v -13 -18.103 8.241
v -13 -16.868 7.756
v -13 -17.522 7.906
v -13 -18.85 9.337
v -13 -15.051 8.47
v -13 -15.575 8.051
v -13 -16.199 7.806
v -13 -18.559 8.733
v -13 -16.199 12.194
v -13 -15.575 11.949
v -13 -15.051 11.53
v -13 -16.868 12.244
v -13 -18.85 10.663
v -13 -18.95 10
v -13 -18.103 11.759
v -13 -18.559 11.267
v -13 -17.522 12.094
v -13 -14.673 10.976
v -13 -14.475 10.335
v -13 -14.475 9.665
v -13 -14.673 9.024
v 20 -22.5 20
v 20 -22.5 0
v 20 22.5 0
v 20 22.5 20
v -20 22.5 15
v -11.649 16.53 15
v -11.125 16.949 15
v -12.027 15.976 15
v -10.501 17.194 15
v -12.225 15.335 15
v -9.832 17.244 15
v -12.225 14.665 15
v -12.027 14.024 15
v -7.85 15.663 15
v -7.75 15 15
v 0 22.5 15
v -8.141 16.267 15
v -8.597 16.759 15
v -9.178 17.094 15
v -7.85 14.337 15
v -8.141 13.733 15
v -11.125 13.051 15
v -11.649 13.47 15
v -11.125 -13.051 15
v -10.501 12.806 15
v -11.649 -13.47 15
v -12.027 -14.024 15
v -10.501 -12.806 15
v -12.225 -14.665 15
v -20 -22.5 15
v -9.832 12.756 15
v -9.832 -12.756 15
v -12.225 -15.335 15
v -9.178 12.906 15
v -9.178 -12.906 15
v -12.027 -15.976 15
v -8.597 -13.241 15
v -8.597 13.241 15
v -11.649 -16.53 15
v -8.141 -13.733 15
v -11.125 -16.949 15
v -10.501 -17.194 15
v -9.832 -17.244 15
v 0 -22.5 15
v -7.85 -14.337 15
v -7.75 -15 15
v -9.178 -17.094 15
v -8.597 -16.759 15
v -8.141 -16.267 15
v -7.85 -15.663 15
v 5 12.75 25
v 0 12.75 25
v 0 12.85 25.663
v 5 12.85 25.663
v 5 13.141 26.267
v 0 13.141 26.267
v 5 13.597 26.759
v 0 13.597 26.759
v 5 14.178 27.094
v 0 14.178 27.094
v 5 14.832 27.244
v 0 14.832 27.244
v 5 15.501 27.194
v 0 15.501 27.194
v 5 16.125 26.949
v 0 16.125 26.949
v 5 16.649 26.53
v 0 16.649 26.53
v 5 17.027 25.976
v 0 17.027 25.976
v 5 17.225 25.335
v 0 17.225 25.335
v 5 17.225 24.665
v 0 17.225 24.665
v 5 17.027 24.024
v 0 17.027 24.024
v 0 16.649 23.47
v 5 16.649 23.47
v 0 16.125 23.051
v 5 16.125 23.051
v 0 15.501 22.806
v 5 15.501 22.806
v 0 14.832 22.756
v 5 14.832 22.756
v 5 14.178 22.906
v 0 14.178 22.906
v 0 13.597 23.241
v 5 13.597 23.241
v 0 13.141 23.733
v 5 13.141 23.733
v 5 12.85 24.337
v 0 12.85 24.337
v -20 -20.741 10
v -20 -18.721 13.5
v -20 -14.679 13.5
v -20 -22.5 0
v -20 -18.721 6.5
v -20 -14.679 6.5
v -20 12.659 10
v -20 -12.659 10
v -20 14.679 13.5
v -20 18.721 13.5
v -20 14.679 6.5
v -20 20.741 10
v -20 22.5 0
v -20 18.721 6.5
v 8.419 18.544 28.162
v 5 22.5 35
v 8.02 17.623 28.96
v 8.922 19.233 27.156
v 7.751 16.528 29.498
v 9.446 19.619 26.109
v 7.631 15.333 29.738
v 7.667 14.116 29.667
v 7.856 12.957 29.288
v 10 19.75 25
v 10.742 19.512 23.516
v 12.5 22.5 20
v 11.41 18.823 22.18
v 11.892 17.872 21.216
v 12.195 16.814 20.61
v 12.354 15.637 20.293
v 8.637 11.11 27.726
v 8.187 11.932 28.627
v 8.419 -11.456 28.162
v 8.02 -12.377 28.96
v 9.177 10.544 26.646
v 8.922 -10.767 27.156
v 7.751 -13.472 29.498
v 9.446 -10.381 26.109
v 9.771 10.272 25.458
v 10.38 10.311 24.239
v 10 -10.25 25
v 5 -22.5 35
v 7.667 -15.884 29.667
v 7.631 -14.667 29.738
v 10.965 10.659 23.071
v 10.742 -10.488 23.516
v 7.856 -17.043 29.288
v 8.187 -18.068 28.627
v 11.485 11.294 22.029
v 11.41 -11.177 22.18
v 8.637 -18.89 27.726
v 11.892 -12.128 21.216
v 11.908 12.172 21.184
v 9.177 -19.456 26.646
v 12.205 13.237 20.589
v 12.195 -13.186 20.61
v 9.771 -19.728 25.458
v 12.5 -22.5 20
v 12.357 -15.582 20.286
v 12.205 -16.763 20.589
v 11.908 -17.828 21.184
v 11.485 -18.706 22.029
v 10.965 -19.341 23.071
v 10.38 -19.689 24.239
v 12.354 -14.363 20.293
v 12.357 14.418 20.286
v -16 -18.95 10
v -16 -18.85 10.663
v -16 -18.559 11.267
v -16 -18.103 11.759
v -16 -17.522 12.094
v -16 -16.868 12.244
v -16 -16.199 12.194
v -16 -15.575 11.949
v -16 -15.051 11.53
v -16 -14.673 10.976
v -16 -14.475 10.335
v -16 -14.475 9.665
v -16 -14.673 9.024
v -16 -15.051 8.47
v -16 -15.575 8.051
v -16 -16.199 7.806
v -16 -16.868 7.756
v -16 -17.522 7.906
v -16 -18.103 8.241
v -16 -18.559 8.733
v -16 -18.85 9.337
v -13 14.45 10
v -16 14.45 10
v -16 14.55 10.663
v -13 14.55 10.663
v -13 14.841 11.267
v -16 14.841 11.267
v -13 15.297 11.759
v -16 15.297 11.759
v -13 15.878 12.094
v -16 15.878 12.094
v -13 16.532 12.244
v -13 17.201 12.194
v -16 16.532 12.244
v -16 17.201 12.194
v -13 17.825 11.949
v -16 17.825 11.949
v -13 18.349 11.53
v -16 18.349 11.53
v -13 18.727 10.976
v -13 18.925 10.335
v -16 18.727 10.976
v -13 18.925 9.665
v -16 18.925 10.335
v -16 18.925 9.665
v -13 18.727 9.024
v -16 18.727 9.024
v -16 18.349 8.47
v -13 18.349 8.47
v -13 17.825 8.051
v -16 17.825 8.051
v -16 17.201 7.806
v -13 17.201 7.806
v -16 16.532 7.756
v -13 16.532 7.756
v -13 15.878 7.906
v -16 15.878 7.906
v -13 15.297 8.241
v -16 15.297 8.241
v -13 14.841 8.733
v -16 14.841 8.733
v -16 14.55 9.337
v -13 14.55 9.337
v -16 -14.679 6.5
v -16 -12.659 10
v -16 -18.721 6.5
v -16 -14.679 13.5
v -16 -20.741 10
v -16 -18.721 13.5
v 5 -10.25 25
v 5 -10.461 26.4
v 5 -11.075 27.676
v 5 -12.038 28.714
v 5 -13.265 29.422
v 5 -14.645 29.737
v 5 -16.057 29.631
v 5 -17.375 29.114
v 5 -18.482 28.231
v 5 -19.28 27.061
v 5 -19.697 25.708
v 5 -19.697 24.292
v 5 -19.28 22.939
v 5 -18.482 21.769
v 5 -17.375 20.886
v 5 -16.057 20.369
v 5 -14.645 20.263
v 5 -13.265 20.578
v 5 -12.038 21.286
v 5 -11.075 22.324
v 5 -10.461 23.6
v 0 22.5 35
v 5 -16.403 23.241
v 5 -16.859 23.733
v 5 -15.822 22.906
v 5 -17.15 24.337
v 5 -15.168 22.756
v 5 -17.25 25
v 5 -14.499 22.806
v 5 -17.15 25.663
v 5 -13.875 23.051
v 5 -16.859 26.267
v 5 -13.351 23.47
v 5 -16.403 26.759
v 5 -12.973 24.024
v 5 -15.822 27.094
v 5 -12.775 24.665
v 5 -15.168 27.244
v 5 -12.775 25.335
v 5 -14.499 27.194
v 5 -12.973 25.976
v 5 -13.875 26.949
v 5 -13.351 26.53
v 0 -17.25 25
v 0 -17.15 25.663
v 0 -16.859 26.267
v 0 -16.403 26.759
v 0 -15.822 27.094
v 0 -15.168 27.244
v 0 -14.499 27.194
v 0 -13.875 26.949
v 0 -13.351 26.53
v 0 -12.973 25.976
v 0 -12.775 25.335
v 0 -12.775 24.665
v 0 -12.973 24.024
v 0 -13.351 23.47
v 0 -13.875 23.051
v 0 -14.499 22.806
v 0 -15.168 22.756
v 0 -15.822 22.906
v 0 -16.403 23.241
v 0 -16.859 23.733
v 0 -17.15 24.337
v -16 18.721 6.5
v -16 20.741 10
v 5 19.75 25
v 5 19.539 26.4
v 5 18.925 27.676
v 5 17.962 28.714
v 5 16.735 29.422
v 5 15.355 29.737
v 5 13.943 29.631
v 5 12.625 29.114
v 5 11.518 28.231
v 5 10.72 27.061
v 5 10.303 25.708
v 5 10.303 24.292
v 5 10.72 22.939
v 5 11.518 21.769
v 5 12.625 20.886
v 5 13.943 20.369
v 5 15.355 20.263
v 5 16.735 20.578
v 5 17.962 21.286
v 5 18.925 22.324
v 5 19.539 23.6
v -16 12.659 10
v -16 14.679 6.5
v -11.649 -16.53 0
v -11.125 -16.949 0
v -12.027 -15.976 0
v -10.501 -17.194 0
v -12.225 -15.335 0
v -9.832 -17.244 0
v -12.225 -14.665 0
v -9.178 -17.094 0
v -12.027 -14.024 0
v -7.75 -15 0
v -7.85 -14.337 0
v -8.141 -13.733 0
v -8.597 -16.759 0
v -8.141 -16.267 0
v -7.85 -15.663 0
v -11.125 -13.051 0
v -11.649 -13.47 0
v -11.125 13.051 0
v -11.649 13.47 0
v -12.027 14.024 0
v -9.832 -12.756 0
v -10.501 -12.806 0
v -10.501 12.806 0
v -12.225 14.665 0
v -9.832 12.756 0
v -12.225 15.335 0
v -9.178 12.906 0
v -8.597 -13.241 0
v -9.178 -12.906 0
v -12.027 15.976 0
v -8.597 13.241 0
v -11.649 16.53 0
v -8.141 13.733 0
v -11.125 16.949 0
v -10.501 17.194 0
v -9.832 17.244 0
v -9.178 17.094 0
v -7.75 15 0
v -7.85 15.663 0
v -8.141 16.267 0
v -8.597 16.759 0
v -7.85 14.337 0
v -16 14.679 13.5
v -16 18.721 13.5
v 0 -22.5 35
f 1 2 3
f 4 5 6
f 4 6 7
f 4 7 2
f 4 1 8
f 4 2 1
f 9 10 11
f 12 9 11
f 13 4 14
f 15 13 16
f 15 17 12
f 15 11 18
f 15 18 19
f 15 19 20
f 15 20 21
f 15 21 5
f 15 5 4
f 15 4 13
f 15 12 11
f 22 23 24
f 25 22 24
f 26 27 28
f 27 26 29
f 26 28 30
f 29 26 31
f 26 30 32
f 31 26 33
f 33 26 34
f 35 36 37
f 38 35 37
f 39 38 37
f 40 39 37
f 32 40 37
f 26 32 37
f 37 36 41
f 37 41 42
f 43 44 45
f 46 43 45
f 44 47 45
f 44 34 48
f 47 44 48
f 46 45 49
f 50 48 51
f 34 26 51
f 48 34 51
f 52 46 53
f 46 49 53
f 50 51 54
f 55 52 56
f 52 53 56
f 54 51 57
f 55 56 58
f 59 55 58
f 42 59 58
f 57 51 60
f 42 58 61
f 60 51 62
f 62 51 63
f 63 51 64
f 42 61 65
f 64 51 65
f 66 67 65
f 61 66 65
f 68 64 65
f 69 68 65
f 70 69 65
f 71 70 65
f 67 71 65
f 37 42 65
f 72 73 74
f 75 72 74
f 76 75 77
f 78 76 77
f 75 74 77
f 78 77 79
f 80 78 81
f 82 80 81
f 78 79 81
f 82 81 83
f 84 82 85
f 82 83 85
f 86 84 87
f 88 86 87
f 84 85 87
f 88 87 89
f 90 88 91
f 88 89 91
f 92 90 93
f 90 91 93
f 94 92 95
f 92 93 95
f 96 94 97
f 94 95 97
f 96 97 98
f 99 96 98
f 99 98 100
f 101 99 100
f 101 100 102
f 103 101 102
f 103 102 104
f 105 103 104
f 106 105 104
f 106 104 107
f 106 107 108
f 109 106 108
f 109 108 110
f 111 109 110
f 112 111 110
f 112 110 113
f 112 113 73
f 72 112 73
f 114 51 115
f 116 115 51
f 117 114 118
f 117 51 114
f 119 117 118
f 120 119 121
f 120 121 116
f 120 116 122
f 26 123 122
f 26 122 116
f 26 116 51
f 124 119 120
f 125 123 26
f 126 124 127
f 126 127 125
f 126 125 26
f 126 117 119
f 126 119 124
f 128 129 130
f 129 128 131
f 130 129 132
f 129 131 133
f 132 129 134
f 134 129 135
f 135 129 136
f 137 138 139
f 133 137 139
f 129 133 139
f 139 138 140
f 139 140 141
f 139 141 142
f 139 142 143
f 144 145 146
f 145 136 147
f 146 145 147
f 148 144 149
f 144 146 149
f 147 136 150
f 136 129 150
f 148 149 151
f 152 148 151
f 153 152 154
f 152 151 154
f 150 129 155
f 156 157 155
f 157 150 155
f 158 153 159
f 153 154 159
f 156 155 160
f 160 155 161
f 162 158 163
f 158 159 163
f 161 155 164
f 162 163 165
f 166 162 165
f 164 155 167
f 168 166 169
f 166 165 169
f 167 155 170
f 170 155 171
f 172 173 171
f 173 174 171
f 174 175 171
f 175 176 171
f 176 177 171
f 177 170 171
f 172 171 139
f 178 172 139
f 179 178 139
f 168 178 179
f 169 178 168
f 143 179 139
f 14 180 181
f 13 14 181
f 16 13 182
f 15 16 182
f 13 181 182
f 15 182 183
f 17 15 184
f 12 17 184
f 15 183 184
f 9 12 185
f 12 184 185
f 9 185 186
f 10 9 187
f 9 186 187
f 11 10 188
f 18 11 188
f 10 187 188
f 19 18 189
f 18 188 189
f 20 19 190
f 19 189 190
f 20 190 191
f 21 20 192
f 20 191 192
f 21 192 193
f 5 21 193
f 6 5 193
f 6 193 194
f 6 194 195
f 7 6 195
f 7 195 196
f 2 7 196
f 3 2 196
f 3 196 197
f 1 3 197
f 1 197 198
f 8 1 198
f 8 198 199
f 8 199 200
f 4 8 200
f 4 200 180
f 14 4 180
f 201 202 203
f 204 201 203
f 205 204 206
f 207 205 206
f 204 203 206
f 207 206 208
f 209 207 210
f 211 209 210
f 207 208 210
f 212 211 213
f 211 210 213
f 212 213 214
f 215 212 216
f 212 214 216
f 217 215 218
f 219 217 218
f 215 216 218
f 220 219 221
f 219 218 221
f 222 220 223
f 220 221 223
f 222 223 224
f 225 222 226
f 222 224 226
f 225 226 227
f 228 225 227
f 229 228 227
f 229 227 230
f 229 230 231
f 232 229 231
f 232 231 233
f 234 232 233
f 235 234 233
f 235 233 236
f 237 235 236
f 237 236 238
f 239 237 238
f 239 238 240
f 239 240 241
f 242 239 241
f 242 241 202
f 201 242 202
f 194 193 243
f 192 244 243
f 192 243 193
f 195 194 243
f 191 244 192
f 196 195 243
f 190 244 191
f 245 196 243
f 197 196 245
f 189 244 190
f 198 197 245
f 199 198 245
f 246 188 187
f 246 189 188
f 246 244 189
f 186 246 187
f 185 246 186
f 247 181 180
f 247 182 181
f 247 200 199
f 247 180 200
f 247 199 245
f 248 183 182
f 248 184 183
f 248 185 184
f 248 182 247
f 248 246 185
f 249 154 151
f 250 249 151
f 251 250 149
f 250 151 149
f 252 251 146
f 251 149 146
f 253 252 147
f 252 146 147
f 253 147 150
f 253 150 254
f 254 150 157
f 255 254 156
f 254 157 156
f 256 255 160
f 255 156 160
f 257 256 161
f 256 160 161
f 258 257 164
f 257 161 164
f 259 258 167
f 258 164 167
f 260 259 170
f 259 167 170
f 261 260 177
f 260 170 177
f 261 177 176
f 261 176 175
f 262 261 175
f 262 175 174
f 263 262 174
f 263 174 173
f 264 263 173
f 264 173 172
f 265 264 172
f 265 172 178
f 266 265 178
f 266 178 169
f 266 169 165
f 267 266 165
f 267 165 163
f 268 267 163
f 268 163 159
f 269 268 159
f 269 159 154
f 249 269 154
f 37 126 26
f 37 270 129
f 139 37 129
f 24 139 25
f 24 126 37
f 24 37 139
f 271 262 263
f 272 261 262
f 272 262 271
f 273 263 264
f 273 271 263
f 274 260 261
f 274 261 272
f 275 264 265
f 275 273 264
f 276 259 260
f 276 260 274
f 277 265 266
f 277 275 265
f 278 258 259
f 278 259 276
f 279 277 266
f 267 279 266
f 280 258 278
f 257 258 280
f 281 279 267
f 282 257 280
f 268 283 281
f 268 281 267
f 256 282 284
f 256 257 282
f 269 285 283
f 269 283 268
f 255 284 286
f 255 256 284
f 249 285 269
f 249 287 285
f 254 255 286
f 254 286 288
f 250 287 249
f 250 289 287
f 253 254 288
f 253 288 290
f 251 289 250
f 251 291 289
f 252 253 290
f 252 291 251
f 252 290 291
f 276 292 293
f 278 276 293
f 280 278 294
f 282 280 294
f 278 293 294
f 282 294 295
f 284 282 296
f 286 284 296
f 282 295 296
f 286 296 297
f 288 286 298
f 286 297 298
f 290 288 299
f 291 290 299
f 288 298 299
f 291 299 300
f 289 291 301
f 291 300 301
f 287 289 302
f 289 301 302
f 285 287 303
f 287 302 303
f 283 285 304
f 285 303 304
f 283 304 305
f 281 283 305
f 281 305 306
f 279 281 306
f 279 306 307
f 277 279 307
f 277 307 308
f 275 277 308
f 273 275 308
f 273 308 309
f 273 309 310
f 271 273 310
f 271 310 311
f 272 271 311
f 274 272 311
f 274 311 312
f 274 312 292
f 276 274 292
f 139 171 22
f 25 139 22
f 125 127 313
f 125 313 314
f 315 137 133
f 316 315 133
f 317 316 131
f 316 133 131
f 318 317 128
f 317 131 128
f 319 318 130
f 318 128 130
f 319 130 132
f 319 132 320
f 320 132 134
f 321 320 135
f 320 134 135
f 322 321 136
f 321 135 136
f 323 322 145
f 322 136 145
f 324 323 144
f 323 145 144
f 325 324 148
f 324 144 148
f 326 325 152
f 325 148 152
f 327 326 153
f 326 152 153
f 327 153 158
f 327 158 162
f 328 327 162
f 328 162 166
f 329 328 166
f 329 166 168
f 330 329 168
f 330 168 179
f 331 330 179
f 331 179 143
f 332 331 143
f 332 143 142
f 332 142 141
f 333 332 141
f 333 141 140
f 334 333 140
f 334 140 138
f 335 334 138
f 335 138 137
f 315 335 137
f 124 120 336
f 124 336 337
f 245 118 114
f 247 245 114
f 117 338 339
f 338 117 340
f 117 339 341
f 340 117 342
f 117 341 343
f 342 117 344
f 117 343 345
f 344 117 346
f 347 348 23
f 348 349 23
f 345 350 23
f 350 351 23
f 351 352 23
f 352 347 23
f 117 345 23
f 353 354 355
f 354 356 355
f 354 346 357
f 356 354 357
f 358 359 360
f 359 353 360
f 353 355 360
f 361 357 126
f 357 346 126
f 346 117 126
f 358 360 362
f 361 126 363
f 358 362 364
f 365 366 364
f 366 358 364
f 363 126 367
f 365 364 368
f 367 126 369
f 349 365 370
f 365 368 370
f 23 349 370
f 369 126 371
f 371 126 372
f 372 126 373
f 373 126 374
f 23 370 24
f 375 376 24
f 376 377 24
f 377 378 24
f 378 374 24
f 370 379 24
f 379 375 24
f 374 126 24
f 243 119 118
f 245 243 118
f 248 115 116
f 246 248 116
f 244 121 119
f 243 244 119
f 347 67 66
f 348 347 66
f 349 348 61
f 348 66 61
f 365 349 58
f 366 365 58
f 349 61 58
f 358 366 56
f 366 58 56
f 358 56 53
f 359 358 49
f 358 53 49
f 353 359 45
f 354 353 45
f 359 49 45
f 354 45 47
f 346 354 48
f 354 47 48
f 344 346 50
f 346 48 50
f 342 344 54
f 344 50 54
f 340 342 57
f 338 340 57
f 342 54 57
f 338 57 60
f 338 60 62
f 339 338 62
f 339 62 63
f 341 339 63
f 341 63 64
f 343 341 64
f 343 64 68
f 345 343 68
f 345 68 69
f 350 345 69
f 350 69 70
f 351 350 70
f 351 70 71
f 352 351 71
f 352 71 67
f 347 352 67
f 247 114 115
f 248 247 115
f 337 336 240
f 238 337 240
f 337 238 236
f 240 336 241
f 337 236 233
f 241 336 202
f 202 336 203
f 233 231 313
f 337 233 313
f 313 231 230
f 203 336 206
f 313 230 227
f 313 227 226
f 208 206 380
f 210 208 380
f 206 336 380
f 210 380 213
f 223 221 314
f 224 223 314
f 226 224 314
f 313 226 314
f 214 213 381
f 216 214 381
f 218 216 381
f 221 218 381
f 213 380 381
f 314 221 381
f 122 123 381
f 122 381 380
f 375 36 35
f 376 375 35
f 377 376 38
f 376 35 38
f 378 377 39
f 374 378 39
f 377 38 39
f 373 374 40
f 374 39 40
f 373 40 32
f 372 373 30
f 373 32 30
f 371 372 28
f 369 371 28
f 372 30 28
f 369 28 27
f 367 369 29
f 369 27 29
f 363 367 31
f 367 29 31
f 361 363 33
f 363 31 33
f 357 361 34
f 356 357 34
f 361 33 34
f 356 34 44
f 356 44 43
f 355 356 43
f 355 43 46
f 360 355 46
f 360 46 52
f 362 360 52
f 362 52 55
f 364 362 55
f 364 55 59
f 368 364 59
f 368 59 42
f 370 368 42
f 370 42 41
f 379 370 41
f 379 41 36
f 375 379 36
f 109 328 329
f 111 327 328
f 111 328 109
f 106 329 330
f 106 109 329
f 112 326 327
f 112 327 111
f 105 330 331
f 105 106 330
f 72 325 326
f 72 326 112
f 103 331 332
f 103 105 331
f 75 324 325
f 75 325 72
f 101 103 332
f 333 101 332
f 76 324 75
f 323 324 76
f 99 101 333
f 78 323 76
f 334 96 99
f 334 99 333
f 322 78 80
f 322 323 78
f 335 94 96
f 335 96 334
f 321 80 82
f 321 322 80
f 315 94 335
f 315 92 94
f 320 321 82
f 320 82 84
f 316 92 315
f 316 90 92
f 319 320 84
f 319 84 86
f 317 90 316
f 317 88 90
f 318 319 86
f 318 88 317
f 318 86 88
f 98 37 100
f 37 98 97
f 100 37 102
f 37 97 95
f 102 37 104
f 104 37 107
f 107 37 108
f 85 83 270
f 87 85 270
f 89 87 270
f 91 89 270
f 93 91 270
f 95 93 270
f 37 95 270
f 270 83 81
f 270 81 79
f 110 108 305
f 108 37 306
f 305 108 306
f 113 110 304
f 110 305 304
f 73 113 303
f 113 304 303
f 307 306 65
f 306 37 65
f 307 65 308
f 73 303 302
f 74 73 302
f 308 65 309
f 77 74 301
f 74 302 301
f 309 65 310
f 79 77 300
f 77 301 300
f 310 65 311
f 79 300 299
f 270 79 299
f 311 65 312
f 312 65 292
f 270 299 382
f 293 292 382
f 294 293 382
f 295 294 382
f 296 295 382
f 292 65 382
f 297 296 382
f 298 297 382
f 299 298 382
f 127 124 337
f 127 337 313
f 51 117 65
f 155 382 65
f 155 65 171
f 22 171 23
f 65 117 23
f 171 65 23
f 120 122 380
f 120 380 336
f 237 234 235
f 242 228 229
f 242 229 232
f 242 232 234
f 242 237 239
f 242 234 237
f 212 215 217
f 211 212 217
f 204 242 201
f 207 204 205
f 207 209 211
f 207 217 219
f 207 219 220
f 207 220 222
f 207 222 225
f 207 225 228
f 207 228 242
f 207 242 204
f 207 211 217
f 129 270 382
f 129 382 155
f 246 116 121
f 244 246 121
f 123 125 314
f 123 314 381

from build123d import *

# Parameters (mm, degrees)
SKETCH_W        = 40
SKETCH_H        = 45
PAD_DEPTH       = 35
POCKET_DEPTH    = 45.001
SKETCH002_R     = 2.25
POCKET001_DEPTH = 15.001
SKETCH003_R     = 2.25
POCKET002_DEPTH = 20.001
SKETCH004_R     = 4.75
POCKET003_DEPTH = 15
POCKET004_DEPTH = 4
SKETCH006_R     = 2.25
POCKET005_DEPTH = 7


with BuildPart() as part:
    # Sketch → Pad (new body)
    with BuildSketch(Plane.XY):
        Rectangle(SKETCH_W, SKETCH_H)
    extrude(amount=PAD_DEPTH)

    # Sketch001 → Pocket (cut, through all)
    with BuildSketch(Plane.XZ.offset(22.5)):
        Polygon((-21, 15), (0, 15), (0, 35), (5, 35), (12.5, 20), (21, 20), (21, 36), (-21, 36), align=None)
    extrude(amount=-POCKET_DEPTH, mode=Mode.SUBTRACT)

    # Sketch002 → Pocket001 (cut, through all)
    with BuildSketch(Plane.XY.offset(15)):
        with Locations((-10, 15)):
            Circle(SKETCH002_R)
        with Locations((-10, -15)):
            Circle(SKETCH002_R)
    extrude(amount=-POCKET001_DEPTH, mode=Mode.SUBTRACT)

    # Sketch003 → Pocket002 (cut, through all)
    with BuildSketch(Plane(origin=(0, 0, 0), x_dir=(0, -1, 0), z_dir=(-1, 0, 0))):
        with Locations((-15, 25)):
            Circle(SKETCH003_R)
        with Locations((15, 25)):
            Circle(SKETCH003_R)
    extrude(amount=-POCKET002_DEPTH, mode=Mode.SUBTRACT)

    # Sketch004 → Pocket003 (cut)
    with BuildSketch(Plane.YZ.offset(20)):
        with Locations((-15, 25)):
            Circle(SKETCH004_R)
        with Locations((15, 25)):
            Circle(SKETCH004_R)
    extrude(amount=-POCKET003_DEPTH, mode=Mode.SUBTRACT)

    # Sketch005 → Pocket004 (cut)
    with BuildSketch(Plane(origin=(-20, 0, 0), x_dir=(0, -1, 0), z_dir=(-1, 0, 0))):
        Polygon((-18.720726, 13.5), (-14.679274, 13.5), (-12.658548, 10), (-14.679274, 6.5), (-18.720726, 6.5), (-20.741452, 10), align=None)
        Polygon((12.658548, 10), (14.679274, 6.5), (18.720726, 6.5), (20.741452, 10), (18.720726, 13.5), (14.679274, 13.5), align=None)
    extrude(amount=-POCKET004_DEPTH, mode=Mode.SUBTRACT)

    # Sketch006 → Pocket005 (cut)
    with BuildSketch(Plane(origin=(-20, 0, 0), x_dir=(0, -1, 0), z_dir=(-1, 0, 0))):
        with Locations((-16.7, 10)):
            Circle(SKETCH006_R)
        with Locations((16.7, 10)):
            Circle(SKETCH006_R)
    extrude(amount=-POCKET005_DEPTH, mode=Mode.SUBTRACT)


solid = part.part
